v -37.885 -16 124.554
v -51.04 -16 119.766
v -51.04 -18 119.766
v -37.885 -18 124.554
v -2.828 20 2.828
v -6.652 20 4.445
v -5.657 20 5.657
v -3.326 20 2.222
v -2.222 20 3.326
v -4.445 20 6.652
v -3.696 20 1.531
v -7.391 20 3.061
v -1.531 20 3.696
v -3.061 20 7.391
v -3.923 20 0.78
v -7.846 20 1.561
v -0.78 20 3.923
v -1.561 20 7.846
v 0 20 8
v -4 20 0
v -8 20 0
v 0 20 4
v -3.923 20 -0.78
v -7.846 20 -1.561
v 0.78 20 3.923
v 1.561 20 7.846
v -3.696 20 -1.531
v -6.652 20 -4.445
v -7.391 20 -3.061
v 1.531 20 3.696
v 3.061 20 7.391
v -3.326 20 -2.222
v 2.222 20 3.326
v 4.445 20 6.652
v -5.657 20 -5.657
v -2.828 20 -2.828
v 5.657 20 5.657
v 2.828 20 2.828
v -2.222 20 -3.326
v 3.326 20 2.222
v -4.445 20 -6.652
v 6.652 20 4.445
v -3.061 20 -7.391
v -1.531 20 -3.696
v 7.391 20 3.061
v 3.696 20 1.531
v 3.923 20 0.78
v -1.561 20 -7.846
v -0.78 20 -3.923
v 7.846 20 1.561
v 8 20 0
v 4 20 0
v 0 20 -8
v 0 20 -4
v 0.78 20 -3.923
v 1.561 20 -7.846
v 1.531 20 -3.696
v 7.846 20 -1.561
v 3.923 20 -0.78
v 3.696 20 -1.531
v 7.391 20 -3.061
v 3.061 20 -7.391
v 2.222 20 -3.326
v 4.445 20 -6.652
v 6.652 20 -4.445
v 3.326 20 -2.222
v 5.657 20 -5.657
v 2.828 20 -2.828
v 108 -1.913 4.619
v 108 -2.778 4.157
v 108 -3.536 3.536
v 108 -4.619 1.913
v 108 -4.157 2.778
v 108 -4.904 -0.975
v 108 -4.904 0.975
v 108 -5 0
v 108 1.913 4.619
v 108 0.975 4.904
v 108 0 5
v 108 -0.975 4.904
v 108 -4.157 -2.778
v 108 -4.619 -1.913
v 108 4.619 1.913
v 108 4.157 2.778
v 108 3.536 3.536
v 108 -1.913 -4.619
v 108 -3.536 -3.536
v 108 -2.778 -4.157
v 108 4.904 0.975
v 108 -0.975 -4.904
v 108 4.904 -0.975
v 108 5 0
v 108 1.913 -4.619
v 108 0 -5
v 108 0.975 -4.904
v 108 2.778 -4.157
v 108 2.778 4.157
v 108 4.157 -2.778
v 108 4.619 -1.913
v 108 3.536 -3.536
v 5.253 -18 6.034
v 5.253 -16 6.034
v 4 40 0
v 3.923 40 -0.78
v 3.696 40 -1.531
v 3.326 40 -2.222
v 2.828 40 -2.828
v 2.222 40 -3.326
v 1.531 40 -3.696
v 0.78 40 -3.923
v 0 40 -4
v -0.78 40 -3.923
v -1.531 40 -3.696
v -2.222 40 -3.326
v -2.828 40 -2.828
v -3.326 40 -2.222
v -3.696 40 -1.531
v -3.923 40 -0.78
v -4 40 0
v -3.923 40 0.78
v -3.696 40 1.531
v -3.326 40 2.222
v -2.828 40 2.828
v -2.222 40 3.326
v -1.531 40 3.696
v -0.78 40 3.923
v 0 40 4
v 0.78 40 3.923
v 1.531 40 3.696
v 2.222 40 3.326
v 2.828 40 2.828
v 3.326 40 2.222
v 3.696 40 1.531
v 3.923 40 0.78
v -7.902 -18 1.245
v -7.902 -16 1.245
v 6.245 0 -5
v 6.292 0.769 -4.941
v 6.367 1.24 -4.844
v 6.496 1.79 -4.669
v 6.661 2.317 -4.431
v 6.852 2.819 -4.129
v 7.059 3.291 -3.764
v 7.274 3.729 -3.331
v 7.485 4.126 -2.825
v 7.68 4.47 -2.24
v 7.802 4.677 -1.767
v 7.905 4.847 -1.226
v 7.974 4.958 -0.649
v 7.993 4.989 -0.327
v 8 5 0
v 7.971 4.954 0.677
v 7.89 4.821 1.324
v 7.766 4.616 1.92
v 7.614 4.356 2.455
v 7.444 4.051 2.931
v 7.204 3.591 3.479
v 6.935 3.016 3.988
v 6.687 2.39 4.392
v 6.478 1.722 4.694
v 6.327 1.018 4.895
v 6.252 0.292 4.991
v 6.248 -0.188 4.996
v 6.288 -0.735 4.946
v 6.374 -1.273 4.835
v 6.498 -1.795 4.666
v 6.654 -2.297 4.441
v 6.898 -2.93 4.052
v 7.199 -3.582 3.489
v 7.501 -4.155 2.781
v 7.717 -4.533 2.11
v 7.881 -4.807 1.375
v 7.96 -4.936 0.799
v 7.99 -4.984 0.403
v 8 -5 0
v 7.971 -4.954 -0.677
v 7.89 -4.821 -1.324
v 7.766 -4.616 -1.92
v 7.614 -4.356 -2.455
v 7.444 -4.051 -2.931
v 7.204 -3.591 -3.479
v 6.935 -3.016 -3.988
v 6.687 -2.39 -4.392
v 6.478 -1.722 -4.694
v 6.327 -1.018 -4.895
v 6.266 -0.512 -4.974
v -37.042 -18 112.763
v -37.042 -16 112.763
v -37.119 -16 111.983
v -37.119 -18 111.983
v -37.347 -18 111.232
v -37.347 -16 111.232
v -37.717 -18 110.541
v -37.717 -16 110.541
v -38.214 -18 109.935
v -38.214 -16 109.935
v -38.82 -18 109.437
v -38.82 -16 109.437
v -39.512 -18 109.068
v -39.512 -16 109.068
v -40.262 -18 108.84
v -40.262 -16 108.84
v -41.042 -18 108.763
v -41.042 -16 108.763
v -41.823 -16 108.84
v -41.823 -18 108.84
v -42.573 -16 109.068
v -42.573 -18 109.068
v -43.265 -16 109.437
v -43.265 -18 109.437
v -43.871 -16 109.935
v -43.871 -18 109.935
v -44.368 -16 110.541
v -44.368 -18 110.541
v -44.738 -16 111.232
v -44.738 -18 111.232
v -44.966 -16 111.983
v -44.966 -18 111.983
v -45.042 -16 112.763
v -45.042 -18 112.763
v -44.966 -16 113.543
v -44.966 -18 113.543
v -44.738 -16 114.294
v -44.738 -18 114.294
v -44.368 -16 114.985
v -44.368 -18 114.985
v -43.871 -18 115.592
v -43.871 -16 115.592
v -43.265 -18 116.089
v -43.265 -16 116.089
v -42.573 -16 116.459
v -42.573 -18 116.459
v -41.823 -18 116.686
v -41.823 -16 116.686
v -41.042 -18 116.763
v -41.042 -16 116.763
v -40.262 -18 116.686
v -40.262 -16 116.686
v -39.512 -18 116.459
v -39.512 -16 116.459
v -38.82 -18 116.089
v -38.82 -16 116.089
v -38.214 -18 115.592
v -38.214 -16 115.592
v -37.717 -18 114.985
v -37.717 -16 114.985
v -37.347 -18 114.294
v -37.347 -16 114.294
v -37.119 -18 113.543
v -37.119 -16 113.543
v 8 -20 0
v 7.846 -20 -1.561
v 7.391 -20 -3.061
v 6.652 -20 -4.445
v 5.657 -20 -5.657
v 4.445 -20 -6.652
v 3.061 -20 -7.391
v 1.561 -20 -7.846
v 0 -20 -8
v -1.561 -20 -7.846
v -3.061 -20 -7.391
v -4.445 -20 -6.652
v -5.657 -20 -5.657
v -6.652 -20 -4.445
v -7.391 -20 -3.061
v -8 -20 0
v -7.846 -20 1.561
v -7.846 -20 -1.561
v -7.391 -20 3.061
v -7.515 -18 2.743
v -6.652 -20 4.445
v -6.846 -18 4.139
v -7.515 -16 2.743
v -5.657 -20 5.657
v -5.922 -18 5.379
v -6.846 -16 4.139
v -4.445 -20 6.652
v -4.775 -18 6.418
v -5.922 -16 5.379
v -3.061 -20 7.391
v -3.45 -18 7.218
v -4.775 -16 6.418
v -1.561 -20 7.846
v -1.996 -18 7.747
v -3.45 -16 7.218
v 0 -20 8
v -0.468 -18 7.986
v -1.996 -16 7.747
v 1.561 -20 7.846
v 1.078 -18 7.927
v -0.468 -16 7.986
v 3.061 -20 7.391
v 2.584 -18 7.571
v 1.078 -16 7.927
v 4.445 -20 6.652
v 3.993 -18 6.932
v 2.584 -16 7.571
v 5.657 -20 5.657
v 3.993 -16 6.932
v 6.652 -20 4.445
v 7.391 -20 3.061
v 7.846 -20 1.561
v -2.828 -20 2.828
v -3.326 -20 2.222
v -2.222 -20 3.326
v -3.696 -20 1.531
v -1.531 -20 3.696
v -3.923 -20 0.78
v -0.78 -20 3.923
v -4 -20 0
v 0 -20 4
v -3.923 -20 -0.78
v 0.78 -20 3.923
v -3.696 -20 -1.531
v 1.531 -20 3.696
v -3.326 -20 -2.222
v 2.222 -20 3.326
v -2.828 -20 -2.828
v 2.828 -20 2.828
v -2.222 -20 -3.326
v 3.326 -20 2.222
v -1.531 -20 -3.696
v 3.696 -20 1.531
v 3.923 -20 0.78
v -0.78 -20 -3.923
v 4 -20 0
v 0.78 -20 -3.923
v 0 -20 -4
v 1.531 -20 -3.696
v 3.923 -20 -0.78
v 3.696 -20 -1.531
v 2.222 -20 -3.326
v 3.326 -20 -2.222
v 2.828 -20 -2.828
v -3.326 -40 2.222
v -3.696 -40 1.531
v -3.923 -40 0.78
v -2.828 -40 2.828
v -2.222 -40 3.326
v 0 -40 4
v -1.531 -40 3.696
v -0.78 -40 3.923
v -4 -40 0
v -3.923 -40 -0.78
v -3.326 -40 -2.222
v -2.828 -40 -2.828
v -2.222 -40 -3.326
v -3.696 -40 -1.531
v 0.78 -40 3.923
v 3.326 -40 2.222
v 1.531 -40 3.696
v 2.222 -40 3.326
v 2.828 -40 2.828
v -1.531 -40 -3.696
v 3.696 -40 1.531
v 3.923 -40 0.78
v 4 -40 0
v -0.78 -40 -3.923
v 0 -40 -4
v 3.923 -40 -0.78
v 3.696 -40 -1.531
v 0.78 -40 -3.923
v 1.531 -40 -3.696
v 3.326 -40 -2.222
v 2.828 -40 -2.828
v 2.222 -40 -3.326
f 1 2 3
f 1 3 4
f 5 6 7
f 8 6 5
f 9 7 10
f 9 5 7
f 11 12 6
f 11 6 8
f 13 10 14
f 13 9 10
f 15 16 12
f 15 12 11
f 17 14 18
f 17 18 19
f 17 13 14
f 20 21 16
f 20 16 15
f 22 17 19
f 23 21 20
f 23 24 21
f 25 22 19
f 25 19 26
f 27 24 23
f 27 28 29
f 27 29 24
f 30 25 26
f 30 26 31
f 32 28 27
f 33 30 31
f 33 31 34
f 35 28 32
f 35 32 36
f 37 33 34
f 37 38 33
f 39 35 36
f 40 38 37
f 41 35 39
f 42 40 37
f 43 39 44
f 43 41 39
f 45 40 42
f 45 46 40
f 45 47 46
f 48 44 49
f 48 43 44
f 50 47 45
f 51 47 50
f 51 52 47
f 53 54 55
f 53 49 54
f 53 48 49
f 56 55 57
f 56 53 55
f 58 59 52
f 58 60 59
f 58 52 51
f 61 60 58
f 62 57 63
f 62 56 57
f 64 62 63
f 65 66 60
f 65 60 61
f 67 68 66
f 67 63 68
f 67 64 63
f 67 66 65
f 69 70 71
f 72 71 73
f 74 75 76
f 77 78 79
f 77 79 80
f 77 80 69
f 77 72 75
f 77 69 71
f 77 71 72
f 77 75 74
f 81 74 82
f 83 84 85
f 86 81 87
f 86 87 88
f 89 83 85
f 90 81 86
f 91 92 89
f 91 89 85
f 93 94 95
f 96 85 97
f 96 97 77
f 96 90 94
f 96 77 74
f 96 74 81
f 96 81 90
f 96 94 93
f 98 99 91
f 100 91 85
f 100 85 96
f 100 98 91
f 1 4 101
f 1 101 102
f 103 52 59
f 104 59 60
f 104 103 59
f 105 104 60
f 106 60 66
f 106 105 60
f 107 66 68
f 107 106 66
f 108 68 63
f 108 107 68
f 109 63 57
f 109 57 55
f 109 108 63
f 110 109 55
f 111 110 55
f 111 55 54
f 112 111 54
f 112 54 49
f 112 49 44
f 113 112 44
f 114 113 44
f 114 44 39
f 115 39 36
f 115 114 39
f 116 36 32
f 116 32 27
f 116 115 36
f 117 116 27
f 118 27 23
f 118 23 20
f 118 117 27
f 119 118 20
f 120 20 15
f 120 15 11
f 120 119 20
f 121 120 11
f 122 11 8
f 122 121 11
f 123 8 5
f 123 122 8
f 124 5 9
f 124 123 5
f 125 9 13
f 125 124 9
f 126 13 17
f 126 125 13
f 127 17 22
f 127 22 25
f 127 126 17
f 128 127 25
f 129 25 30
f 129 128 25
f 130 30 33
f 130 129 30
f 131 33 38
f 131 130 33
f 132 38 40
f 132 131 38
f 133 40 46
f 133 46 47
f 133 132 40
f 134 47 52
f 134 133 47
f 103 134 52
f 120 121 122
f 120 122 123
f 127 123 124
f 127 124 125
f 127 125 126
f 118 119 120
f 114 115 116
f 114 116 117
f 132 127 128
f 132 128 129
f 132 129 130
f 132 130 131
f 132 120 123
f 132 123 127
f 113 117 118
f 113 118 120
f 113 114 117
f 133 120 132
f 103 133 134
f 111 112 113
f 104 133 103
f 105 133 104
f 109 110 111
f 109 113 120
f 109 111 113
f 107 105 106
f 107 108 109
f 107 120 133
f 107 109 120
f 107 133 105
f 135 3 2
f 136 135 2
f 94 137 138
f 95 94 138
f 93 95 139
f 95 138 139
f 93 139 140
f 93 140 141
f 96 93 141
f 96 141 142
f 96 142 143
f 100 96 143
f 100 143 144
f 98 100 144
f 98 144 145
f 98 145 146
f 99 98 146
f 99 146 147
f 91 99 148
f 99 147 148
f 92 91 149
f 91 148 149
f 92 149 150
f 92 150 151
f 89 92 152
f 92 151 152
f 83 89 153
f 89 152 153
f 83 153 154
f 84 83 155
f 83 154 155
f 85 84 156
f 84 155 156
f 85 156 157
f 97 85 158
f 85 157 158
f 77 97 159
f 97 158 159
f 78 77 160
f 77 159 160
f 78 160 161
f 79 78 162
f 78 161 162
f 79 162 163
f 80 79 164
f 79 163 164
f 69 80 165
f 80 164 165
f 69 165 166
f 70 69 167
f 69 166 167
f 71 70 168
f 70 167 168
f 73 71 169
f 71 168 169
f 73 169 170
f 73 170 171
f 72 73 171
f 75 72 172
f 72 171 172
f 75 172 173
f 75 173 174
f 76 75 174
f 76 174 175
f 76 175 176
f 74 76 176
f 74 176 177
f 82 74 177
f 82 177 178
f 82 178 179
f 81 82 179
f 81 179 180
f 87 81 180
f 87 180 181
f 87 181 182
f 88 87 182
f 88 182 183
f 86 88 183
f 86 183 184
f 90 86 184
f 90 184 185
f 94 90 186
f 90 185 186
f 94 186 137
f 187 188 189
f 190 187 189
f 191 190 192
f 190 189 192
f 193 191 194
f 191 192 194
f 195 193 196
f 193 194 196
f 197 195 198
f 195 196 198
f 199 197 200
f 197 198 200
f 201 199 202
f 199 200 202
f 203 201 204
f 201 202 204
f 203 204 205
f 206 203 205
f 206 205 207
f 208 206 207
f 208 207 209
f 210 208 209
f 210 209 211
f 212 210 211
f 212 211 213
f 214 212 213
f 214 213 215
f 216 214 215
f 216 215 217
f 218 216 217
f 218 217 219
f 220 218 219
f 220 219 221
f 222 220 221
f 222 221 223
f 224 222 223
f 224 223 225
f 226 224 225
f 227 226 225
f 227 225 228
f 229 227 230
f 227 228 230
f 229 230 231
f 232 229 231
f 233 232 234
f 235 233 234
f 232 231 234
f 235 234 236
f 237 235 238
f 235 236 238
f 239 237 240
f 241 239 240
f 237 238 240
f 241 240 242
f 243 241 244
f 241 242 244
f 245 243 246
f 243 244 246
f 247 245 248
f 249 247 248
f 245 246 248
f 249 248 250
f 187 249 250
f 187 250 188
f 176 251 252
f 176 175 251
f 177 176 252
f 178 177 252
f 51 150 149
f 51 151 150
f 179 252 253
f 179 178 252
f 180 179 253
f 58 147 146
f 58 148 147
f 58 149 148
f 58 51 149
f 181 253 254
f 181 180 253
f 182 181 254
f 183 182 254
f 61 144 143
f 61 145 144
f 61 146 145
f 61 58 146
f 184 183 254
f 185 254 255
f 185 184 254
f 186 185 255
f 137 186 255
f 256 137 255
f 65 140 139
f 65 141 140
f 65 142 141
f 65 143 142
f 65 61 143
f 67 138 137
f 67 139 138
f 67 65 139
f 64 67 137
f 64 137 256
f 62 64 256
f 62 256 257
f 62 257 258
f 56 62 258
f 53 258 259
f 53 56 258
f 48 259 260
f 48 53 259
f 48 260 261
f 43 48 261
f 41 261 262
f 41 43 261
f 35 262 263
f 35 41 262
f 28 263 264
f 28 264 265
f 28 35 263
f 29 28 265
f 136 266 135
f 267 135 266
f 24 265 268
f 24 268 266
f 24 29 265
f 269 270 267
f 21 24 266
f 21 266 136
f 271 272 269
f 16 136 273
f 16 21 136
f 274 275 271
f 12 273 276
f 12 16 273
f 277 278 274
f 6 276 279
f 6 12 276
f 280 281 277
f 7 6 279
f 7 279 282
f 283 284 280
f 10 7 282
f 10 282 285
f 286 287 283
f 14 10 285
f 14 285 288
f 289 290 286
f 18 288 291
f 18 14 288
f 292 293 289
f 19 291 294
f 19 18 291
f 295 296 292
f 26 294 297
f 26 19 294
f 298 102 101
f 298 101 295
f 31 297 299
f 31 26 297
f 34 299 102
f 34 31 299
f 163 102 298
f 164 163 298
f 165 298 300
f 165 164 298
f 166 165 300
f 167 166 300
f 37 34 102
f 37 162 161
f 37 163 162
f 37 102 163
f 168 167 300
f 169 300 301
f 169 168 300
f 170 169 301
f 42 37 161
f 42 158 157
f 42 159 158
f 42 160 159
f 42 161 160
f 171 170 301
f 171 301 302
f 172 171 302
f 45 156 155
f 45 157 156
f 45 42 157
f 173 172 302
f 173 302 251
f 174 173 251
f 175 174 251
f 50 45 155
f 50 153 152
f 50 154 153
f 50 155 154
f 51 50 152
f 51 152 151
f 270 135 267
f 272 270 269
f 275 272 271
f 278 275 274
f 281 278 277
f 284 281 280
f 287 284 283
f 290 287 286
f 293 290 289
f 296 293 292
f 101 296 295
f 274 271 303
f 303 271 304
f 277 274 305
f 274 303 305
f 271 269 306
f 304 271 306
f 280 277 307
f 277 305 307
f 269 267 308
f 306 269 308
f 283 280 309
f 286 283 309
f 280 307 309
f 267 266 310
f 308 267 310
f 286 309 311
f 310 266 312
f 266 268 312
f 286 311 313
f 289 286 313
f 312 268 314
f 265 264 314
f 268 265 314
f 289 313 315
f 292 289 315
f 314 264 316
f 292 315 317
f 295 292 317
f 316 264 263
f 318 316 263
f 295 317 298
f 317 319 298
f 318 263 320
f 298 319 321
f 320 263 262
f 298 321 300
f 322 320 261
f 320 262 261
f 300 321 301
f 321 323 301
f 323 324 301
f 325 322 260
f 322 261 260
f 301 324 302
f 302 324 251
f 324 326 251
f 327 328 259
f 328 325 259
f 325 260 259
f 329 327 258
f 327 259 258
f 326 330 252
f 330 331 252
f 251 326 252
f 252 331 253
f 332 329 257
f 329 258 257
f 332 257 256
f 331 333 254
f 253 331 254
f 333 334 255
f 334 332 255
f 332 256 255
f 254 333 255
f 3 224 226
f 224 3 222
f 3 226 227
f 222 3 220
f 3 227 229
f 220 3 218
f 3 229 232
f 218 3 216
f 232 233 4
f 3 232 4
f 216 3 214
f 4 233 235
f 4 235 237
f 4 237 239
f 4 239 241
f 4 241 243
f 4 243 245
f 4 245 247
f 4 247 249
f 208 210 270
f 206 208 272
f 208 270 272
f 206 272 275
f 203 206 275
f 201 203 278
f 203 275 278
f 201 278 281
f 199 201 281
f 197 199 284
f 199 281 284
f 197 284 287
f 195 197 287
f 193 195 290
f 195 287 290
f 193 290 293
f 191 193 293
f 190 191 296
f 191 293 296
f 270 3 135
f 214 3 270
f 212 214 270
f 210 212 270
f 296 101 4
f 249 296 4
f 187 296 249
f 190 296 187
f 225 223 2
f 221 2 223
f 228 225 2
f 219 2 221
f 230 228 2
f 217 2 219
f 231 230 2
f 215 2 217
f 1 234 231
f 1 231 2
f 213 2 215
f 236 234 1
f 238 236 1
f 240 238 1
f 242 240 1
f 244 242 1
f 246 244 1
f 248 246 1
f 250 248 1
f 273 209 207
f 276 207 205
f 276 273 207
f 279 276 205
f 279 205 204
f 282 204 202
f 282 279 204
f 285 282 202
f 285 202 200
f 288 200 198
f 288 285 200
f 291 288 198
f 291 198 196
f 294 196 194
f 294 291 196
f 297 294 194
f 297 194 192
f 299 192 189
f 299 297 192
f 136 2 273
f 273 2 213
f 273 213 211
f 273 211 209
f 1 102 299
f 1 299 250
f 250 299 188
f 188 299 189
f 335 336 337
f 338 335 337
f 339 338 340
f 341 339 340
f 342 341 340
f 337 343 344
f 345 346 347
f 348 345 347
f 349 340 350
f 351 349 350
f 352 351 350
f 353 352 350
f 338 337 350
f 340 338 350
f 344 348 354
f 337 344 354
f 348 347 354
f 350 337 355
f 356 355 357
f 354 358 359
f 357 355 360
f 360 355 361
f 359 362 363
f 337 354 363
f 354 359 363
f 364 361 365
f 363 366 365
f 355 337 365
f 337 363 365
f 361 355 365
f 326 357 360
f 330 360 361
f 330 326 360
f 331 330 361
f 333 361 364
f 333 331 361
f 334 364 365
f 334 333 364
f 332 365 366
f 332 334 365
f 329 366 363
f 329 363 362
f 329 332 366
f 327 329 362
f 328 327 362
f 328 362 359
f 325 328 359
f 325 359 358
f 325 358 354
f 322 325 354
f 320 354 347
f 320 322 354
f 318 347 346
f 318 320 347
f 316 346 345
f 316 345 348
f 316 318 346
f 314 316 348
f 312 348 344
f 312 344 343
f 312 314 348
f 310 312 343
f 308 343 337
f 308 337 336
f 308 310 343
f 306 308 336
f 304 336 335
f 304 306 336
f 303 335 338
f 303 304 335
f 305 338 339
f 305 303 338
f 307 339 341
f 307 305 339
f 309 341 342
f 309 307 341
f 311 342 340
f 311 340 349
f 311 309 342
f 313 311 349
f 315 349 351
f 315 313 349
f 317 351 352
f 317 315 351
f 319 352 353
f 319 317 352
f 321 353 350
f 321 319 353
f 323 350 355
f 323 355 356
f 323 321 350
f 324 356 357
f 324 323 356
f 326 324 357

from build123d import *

# Parameters (mm, degrees)
SKETCH1_R           = 4
BOSS_EXTRUDE1_DEPTH = 40
SKETCH3_R           = 8
BOSS_EXTRUDE2_DEPTH = 20
SKETCH4_R           = 5
BOSS_EXTRUDE3_DEPTH = 108
SKETCH5_W           = 14
SKETCH5_H           = 2
BOSS_EXTRUDE4_DEPTH = 130
CUT_EXTRUDE1_REACH  = 176.108
SKETCH6_R           = 4


with BuildPart() as part:
    # Sketch1 → Boss-Extrude1 (new, symmetric)
    with BuildSketch(Plane(origin=(0, 0, 0), x_dir=(1, 0, 0), z_dir=(0, 1, 0))):
        Circle(SKETCH1_R)
    extrude(amount=BOSS_EXTRUDE1_DEPTH, both=True)

    # Sketch3 → Boss-Extrude2 (add, symmetric)
    with BuildSketch(Plane(origin=(0, 0, 0), x_dir=(1, 0, 0), z_dir=(0, 1, 0))):
        Circle(SKETCH3_R)
    extrude(amount=BOSS_EXTRUDE2_DEPTH, both=True)

    # Sketch4 → Boss-Extrude3 (add)
    with BuildSketch(Plane(origin=(0, 0, 0), x_dir=(0, 0, -1), z_dir=(1, 0, 0))):
        Circle(SKETCH4_R)
    extrude(amount=BOSS_EXTRUDE3_DEPTH)

    # Sketch5 → Boss-Extrude4 (add)
    with BuildSketch(Plane(origin=(0, 0, 0), x_dir=(0.939692620785908, 0, 0.34202014332566977), z_dir=(-0.34202014332566977, 0, 0.939692620785908))):
        with Locations((0, -17)):
            Rectangle(SKETCH5_W, SKETCH5_H)
    extrude(amount=BOSS_EXTRUDE4_DEPTH)

    # Sketch6 → Cut-Extrude1 (cut, up to next)
    with BuildSketch(Plane(origin=(0, -16, 0), x_dir=(1, 0, 0), z_dir=(0, 1, 0)), mode=Mode.PRIVATE) as cut_extrude1_sk1:
        with Locations((-41.042417199, -112.763114494)):
            Circle(SKETCH6_R)
    cut_extrude1_tool1 = extrude(cut_extrude1_sk1.sketch, amount=-CUT_EXTRUDE1_REACH, mode=Mode.PRIVATE) & part.part
    add(cut_extrude1_tool1.solids().sort_by_distance((-41.042417, -16, 112.763114))[0], mode=Mode.SUBTRACT)


solid = part.part
